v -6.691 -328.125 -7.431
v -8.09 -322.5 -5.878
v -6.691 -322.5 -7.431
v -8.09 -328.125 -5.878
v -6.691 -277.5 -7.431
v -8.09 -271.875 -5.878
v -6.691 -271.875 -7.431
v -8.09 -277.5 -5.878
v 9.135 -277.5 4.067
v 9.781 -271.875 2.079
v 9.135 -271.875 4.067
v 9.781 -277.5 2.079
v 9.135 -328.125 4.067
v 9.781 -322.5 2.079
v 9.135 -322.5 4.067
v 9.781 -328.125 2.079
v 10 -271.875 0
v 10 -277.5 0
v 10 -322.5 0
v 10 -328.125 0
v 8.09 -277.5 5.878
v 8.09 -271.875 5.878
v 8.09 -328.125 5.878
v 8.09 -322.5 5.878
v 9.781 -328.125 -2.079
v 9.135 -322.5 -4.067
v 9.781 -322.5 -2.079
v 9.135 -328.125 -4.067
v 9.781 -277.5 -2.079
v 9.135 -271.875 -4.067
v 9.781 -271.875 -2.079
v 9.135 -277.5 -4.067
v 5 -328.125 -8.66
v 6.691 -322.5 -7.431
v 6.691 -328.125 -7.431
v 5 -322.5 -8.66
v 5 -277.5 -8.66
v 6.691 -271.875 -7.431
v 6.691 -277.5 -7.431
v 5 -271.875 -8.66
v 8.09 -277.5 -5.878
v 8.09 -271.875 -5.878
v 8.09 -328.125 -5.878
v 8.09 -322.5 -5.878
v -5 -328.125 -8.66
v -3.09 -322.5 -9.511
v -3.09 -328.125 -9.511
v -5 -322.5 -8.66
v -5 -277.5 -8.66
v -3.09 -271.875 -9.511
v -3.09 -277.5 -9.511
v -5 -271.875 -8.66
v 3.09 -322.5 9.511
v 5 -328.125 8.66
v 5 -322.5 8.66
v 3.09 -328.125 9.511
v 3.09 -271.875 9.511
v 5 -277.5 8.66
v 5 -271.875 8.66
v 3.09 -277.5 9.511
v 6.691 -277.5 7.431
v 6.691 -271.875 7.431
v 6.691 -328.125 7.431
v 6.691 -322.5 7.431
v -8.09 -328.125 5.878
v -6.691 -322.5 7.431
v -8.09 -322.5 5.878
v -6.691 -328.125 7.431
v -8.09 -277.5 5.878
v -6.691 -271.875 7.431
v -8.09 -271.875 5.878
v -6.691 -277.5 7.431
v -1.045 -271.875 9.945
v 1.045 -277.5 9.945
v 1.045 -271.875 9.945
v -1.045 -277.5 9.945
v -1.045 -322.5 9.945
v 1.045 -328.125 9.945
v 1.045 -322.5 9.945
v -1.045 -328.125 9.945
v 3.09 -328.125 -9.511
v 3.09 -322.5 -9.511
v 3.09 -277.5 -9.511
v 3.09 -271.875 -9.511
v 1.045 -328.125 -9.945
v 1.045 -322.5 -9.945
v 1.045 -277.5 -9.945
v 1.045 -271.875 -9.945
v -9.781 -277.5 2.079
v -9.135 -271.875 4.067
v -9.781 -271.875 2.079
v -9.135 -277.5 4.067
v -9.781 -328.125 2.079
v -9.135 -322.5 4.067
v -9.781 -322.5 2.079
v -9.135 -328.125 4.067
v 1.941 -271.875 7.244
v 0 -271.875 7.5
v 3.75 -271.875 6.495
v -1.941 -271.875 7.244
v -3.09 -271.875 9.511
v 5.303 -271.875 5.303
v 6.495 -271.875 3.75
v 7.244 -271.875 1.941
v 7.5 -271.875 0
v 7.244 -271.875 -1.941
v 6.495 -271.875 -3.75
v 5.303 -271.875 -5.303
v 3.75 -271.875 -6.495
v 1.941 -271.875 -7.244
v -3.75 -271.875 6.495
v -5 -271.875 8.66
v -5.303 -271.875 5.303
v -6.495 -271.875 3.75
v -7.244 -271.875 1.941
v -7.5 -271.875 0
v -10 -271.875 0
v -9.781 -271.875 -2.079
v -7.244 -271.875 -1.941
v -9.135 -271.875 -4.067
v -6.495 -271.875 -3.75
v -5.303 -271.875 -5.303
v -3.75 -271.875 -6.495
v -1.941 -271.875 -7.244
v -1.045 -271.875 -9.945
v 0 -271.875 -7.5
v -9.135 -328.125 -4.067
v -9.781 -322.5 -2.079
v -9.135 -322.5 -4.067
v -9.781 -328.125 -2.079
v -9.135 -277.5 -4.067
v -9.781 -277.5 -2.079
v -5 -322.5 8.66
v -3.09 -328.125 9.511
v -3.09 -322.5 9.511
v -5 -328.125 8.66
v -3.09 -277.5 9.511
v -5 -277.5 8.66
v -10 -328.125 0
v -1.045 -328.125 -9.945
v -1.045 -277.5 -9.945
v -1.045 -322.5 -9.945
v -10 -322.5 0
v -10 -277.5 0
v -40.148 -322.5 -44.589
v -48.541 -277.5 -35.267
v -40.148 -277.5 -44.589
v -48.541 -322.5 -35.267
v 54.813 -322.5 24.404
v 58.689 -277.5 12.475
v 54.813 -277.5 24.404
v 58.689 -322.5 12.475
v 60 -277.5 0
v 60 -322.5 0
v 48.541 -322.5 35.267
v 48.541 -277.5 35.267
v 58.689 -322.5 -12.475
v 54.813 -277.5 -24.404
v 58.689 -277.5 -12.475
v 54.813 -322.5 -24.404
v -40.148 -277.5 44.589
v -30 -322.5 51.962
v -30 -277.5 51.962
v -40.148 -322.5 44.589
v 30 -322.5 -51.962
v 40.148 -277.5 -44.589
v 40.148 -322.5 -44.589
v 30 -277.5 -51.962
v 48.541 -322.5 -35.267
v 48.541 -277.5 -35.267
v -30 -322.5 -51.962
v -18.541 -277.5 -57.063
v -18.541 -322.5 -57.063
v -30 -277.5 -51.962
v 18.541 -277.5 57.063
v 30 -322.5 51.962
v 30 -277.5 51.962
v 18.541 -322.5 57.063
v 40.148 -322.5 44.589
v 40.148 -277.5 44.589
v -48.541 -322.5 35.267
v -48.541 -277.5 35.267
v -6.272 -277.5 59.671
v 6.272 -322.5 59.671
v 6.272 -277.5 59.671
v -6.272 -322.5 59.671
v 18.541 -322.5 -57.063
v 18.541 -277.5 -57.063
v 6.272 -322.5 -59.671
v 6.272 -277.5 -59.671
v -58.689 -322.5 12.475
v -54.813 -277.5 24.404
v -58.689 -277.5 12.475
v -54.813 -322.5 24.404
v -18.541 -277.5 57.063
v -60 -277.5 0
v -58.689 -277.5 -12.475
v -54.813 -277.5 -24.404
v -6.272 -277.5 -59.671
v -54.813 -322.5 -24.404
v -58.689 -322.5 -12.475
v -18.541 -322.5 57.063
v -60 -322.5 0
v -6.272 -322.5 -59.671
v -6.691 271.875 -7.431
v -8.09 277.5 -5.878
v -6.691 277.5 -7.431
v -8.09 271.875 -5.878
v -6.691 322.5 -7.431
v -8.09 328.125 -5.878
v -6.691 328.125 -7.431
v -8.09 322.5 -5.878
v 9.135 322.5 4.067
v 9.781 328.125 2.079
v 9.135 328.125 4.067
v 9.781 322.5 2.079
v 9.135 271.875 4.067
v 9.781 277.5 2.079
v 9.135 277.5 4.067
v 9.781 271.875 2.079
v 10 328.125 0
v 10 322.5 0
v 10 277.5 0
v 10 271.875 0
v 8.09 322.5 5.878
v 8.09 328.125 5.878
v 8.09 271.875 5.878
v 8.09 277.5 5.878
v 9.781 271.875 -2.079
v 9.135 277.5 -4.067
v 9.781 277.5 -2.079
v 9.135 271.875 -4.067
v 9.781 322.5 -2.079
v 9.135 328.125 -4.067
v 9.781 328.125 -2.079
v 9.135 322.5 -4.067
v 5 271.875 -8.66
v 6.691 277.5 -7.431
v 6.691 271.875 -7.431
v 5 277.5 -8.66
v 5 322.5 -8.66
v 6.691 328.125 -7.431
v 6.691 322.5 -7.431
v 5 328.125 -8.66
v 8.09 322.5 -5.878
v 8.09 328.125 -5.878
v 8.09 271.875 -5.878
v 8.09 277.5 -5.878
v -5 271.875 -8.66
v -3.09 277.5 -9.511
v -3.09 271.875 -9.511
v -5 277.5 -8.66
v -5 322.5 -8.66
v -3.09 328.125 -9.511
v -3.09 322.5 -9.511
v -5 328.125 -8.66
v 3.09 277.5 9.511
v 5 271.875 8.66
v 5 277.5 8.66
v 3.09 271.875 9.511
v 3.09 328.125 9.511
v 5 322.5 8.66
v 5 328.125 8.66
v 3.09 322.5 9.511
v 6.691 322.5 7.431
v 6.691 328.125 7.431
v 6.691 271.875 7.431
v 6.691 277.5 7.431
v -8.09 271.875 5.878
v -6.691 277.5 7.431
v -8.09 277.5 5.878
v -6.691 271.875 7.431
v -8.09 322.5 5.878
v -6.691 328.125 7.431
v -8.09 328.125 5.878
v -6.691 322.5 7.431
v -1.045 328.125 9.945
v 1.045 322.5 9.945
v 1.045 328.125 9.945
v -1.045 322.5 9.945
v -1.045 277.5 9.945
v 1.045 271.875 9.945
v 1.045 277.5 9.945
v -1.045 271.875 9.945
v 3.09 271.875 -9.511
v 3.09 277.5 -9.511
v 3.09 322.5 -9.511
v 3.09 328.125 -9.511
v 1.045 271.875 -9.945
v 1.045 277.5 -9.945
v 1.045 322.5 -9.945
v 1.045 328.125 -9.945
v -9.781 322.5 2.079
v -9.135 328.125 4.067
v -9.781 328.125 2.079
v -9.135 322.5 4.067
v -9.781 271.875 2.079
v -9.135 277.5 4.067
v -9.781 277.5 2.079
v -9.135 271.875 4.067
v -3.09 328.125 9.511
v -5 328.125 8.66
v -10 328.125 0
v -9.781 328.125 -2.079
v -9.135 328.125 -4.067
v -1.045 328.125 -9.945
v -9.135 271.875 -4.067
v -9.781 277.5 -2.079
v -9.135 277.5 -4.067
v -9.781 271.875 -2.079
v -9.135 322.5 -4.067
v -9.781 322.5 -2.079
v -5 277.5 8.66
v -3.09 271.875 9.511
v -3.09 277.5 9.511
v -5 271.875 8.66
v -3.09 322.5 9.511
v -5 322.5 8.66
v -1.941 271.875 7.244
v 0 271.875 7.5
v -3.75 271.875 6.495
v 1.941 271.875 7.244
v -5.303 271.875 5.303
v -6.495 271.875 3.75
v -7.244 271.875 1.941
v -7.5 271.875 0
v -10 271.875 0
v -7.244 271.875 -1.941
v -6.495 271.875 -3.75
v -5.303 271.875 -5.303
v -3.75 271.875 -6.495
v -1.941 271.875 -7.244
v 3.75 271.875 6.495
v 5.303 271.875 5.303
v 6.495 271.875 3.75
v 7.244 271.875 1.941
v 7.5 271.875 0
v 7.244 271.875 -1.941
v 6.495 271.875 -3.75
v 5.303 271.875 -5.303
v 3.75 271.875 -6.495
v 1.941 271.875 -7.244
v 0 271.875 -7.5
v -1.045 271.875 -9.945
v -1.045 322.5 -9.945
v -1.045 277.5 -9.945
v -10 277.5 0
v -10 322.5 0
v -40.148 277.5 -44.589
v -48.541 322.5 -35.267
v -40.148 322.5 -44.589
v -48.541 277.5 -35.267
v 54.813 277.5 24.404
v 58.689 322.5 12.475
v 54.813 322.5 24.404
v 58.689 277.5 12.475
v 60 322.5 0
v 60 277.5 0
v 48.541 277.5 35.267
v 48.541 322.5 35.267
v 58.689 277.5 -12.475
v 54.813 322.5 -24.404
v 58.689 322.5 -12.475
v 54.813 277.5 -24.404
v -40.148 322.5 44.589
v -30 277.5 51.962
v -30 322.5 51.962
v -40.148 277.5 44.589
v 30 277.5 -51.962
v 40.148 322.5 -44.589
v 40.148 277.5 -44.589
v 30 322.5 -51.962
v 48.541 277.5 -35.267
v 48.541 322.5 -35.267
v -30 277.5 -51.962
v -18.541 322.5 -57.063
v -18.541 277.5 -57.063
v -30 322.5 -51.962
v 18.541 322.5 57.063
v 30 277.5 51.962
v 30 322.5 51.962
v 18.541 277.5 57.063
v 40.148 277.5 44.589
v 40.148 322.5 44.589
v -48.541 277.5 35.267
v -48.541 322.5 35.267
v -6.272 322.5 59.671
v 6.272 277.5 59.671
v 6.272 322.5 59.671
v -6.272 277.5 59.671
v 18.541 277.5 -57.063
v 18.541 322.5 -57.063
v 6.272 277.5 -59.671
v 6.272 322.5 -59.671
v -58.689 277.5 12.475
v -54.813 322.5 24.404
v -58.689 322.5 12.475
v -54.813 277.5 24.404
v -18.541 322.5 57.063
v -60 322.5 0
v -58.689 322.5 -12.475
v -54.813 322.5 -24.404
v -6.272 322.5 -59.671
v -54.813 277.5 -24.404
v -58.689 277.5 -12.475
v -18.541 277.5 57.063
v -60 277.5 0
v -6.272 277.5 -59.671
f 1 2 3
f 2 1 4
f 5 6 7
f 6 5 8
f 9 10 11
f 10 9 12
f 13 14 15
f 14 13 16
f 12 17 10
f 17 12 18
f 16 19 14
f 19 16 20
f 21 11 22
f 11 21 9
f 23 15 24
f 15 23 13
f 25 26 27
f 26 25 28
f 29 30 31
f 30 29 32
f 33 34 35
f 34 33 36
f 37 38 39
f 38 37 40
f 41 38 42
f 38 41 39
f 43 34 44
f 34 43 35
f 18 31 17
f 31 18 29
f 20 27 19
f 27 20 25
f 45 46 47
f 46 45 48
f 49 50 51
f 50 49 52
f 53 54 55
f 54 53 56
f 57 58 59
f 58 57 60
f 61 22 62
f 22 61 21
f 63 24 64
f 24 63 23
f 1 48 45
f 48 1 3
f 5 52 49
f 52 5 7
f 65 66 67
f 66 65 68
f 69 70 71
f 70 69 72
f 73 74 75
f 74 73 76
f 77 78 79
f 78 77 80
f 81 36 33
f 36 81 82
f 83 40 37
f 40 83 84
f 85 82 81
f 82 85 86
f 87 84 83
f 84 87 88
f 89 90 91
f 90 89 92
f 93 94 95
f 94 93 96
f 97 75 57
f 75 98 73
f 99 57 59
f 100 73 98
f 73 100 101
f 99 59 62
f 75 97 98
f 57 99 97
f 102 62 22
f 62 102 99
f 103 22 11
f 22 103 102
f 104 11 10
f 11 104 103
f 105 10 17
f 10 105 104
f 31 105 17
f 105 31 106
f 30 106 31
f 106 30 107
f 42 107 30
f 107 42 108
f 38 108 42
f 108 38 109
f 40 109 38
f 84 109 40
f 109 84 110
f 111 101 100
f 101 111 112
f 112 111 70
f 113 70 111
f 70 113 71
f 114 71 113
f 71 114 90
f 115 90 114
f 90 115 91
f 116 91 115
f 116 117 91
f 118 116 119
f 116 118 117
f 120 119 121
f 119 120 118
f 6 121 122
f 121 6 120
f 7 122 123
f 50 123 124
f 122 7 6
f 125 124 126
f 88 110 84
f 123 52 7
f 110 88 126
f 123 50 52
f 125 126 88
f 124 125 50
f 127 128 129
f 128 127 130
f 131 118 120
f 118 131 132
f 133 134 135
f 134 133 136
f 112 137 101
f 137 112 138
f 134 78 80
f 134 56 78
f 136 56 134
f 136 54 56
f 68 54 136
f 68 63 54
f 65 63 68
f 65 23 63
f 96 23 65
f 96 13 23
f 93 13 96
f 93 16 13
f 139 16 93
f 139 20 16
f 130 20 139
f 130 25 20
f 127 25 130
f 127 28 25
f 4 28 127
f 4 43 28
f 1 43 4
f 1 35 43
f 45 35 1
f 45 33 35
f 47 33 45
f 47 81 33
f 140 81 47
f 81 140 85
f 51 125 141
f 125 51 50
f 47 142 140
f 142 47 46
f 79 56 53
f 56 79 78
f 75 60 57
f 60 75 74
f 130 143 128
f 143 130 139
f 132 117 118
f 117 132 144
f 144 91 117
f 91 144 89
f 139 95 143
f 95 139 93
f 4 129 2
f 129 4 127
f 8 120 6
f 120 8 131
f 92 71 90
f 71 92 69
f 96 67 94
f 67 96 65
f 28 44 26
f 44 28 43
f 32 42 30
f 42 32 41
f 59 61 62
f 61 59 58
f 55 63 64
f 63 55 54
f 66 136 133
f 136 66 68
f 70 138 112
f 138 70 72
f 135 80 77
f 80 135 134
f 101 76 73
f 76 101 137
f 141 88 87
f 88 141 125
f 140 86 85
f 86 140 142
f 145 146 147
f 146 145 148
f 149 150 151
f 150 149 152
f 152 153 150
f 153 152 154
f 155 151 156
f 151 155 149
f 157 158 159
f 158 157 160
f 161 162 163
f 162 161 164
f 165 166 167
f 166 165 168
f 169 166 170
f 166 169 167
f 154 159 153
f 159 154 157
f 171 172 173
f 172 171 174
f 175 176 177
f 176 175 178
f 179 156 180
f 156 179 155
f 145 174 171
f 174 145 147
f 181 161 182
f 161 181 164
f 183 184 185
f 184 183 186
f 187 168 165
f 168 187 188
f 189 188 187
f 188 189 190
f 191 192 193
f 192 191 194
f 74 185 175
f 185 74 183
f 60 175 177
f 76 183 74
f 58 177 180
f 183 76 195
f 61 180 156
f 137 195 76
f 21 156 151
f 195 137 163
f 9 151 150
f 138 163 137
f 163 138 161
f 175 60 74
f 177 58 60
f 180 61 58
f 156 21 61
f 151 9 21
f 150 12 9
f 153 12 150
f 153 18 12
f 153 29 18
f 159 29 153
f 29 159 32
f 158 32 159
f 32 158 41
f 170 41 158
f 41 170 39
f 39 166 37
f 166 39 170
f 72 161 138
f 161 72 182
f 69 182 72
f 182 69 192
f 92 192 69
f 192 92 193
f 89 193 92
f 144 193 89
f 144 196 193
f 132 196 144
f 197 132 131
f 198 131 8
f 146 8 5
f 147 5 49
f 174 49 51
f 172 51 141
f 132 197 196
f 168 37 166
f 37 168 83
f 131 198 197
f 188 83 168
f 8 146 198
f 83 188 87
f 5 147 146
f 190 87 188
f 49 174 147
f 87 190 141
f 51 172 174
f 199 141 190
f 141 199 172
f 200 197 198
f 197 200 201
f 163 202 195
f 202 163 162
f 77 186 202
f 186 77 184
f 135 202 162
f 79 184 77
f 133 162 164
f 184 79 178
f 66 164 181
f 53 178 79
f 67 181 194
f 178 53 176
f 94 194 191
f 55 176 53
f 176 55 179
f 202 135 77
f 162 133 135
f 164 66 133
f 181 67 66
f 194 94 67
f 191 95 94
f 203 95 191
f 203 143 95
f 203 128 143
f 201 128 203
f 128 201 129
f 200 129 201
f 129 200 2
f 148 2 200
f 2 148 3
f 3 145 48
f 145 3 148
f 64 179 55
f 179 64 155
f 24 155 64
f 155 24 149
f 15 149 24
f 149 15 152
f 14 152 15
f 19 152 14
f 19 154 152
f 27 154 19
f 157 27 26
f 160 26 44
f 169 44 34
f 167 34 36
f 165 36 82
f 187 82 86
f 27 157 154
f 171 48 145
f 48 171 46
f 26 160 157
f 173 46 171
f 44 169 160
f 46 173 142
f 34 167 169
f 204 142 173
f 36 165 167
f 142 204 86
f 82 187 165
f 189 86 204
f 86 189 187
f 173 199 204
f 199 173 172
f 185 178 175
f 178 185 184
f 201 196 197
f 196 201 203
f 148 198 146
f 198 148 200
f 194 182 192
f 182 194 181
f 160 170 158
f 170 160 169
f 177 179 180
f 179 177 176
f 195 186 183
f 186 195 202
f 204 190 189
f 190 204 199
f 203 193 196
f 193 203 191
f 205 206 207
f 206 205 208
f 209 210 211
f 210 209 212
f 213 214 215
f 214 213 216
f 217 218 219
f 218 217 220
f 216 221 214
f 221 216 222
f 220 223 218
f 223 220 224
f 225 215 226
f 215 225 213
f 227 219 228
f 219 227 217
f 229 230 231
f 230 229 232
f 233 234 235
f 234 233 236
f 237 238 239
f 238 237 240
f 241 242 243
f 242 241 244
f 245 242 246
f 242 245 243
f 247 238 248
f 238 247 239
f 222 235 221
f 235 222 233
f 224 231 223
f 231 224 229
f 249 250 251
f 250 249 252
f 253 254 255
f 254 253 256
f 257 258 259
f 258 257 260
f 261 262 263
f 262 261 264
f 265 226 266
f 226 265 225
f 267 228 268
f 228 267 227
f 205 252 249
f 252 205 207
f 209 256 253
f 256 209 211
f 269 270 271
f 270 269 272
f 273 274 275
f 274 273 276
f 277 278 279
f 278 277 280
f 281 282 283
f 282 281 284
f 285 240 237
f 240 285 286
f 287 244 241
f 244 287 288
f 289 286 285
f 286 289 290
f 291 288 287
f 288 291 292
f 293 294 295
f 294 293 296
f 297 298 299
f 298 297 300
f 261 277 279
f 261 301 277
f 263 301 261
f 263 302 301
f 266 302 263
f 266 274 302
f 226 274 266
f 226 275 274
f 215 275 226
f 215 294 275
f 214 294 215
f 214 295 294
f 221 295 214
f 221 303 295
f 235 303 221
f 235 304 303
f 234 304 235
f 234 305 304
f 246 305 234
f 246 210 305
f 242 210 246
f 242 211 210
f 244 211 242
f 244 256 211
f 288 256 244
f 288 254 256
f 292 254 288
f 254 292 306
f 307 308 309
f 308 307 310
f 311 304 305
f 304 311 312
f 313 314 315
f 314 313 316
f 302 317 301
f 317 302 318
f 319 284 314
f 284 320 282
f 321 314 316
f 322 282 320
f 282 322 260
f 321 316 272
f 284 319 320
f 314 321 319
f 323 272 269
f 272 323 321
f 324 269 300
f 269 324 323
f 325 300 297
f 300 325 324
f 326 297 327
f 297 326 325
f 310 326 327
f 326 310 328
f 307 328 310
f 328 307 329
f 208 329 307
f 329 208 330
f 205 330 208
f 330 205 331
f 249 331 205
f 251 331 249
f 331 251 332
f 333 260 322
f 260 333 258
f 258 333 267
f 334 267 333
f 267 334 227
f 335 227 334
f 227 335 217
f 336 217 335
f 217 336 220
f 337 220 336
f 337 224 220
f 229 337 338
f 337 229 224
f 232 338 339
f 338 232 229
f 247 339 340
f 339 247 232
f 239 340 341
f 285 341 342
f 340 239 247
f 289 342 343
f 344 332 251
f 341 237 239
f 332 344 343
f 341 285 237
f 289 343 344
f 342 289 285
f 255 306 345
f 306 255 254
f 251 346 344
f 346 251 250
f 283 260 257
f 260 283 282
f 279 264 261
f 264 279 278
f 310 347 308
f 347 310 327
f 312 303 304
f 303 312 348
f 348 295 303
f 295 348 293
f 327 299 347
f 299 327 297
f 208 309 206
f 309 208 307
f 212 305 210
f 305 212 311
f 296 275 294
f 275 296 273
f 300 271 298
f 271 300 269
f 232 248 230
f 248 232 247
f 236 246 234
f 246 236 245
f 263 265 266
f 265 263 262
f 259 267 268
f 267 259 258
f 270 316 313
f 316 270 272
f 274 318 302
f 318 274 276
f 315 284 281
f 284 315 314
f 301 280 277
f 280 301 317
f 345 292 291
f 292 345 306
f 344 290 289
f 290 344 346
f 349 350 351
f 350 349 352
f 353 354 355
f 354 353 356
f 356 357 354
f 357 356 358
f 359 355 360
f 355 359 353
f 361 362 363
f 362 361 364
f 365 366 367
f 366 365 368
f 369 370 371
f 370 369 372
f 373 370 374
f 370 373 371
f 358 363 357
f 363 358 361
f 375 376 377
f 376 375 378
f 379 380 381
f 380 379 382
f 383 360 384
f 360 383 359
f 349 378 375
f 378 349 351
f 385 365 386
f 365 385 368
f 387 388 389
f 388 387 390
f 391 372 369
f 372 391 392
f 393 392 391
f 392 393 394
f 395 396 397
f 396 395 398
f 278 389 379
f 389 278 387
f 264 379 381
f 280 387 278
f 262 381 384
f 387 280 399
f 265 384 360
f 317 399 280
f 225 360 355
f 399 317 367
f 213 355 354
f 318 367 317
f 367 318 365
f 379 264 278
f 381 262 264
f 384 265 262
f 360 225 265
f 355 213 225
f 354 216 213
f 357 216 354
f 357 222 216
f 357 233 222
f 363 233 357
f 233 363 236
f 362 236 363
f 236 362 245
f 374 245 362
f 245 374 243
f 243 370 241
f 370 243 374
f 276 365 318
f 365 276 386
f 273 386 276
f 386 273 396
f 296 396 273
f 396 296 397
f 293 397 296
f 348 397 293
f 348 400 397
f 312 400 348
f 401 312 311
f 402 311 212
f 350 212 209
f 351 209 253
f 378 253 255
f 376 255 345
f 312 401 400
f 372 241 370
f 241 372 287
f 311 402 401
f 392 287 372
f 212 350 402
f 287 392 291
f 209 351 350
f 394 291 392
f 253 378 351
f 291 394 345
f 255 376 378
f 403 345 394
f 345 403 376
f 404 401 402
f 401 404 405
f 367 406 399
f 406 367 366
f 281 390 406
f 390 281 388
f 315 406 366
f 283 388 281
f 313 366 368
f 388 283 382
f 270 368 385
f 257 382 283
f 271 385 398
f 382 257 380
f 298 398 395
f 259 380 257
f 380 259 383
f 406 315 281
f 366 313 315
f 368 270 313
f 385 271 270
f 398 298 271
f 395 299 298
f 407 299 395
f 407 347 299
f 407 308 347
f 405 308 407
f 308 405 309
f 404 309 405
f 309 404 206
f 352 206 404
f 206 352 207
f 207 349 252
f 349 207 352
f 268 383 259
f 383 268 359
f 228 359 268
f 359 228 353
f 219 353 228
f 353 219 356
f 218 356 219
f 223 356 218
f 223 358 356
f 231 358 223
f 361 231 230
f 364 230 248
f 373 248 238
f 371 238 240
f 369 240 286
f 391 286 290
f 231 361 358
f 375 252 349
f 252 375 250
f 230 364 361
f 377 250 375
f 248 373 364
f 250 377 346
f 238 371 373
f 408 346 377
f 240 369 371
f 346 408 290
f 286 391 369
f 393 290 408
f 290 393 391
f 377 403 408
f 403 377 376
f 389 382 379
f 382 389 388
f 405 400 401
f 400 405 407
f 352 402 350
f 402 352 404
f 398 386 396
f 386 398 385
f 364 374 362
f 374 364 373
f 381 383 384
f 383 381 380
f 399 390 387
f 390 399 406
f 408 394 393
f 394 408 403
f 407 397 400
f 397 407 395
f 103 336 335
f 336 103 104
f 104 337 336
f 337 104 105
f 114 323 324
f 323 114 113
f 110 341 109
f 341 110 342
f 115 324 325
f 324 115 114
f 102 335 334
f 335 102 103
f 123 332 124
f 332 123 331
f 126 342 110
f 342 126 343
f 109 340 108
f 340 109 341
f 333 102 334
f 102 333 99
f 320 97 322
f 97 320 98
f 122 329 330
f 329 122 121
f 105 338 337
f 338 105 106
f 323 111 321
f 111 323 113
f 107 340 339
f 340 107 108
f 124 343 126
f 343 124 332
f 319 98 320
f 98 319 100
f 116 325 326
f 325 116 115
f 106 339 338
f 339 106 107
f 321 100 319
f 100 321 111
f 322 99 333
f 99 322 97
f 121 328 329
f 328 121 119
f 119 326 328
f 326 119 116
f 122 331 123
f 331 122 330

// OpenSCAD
module DifferentialModule(lod=0, wheelbase=600, wheeldiam=120, wheelwidth=45){
    
    if (lod==0){
        rotate([90, 0, 0])
        cylinder(h=wheelbase-wheelwidth, d=15, center=true);
        
        // WHEELS 
        for (w=[-1, 1]) {
            translate( w*[0, wheelbase/2, 0])
            rotate([90, 0, 0]){
                color([1,0,0])
                cylinder(d=20, h=wheelwidth*1.25, center=true);
                color([.3,.3,.3])
                cylinder(d=wheeldiam, h=wheelwidth, center=true);
            }
        }
    }
}

DifferentialModule();
